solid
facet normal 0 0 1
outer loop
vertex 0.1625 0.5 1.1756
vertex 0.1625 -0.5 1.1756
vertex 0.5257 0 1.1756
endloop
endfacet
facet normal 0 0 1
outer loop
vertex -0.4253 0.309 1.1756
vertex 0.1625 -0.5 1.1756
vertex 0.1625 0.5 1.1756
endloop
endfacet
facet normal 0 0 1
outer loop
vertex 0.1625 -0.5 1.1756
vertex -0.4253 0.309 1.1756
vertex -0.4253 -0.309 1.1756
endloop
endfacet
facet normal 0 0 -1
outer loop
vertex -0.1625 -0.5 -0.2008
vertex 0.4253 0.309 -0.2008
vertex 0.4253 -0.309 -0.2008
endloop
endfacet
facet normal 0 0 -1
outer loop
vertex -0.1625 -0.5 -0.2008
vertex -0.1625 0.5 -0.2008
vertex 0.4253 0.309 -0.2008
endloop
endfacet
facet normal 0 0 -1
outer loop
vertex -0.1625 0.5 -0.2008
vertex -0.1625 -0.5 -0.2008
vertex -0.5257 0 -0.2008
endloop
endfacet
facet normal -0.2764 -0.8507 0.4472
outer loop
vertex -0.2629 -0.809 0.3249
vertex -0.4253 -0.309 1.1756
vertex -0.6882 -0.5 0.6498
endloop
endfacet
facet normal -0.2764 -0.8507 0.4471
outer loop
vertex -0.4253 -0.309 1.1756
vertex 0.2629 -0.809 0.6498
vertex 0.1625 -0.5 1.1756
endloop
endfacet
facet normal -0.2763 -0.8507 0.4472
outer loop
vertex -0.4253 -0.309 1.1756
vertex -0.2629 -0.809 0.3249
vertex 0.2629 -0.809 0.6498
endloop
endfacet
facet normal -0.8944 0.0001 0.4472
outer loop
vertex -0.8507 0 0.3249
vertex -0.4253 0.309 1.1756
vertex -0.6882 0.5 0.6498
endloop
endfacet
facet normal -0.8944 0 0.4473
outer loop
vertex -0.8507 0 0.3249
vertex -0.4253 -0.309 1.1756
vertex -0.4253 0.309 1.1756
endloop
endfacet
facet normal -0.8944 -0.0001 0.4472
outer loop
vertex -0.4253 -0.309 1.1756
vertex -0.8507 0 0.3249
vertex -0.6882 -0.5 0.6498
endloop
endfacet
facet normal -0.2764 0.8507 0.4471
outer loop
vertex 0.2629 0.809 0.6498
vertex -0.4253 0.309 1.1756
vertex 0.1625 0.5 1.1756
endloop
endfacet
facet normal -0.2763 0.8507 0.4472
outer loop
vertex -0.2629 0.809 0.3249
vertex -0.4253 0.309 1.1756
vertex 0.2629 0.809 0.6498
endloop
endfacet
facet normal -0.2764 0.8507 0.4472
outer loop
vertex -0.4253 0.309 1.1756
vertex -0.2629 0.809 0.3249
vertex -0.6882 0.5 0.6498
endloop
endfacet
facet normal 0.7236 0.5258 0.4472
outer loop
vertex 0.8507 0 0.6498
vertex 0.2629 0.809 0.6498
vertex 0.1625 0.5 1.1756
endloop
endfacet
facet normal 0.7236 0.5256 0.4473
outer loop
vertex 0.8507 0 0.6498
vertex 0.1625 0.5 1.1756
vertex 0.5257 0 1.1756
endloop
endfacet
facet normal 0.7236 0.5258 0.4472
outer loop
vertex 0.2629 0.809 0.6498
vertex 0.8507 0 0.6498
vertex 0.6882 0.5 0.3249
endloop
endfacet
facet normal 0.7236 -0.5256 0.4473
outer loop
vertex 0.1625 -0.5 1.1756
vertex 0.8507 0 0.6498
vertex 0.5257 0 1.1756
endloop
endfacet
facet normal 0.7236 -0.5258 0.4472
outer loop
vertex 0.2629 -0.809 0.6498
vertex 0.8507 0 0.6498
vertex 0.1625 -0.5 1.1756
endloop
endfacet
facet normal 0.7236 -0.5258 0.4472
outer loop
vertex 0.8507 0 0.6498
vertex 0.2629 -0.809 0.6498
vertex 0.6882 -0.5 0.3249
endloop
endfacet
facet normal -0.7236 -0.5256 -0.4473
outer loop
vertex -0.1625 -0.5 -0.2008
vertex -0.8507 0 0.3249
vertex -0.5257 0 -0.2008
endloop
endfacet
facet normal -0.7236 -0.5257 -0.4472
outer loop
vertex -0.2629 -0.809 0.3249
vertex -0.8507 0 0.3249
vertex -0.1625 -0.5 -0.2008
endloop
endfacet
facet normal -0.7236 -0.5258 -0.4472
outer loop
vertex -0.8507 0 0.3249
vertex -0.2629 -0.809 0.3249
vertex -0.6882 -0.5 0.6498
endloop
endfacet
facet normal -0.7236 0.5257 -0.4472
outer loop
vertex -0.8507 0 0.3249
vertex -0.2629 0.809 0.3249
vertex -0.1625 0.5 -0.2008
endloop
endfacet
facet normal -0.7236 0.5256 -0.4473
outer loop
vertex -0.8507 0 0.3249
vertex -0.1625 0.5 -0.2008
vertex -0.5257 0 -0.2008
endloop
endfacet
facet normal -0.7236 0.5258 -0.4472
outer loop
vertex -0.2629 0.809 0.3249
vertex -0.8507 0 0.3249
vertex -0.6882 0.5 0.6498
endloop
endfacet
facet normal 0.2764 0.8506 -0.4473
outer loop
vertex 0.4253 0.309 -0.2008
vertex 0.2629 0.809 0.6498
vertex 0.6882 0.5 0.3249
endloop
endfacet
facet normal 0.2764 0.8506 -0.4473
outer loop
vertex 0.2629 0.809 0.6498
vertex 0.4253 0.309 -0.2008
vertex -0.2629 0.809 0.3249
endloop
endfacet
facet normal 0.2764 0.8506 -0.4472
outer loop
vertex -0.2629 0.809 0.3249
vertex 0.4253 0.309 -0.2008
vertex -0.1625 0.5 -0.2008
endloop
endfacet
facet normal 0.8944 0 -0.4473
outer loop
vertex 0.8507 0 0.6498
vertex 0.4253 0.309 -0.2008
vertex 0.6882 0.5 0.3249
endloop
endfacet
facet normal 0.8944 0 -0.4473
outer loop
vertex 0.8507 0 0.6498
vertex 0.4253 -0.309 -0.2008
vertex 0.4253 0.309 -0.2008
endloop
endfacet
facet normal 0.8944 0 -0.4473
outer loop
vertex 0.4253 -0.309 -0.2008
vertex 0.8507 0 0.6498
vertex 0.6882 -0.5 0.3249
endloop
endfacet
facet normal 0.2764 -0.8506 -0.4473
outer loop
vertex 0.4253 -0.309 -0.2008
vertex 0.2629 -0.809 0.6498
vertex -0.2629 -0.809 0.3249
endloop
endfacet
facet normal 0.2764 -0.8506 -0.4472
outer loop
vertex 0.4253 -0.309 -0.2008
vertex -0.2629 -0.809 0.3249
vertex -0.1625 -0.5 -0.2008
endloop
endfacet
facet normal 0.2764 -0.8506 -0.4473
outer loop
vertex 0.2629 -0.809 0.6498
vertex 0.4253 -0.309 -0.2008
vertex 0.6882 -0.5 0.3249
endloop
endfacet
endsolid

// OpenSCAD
function mod(a,m) = ((a%m)+m)%m;

function add(v, i = 0, r) = 
    i < len(v) ? 
        i == 0 ?
            add(v, 1, v[0]) :
            add(v, i + 1, r + v[i]) :
        r;


function Rout(n) = (1/(2*sin(180/n)));

function Rin(n) = 1/(2*tan(180/n));

function polyangle(n=3, phi=0, z=0) = 
let (r = 1/(2*sin(180/n)), al = 360/n)
[
    for(i=[0: 1: n-1]) [r*cos(i*al+phi),r*sin(i*al+phi),z]
];

function hAntiprism(n) = sqrt(pow(sin(60),2) - pow(Rout(n)-Rin(n),2));
    
function hPyramid(n) = sqrt(1 - pow(Rout(n),2));
    
function FaceCenter(points, face) = 
    let (fp = [for(i=face) points[i]])
        add(fp)/len(fp);

module pyramid(n=3){
    base = polyangle(n);
    top = [0,0, sqrt(1 - pow(Rout(n),2))];
    l = len(base);
    points = [for(b = base) b, top];
    
    faces = [
        [for(i=[0:1:l-1]) i],
        for(i=[l-1:-1:0]) [i, mod(i-1,l), l]
    ];
    
    polyhedron(points, faces);
}

module prism(n=3){
    bottom = polyangle(n);
    top = polyangle(n,z=1);
    l = len(top);
    points = [
        for(b = bottom) b,
        for(b = top) b
    ];
        
    faces = [
        [for(i=[0:1:l-1]) i],
        [for(i=[l-1:-1:0]) l+i],
        for(i=[l-1:-1:0]) let (j=mod(i-1,l)) [i, j, l+j, l+i]
    ];        
        
    polyhedron(points, faces);
}

module antiprism(n=3){
    bottom = polyangle(n);
    top = polyangle(n,phi=180/n,z=hAntiprism(n));
    l = len(top);

    points = [
        for(b = bottom) b,
        for(b = top) b
    ];
    faces = [
        [for(i=[0:1:l-1]) i],
        [for(i=[l-1:-1:0]) l+i],
        for(i=[l-1:-1:0]) let (j=mod(i-1,l)) [i, j, l+j],
        for(i=[l-1:-1:0]) let (j=mod(i-1,l)) [i, l+j, l+i]
    ];        
                
    polyhedron(points, faces);
}

module icosahedron(){
    ha = hAntiprism(5);
    hp = hPyramid(5);
    bottom = polyangle(5);
    top = polyangle(5,phi=180/5,z=ha);
    toptop = [0,0,ha+hp];
    botbot = [0,0,-hp];
    
    l=5;
    points = [
        for(b = bottom) b,
        for(b = top) b,
        toptop, botbot
    ];
    faces = [
        for(i=[l-1:-1:0]) let (j=mod(i-1,l)) [i, j, l+j],
        for(i=[l-1:-1:0]) let (j=mod(i-1,l)) [i, l+j, l+i],
        for(i=[l-1:-1:0]) [mod(i-1,l), i, 2*l+1],
        for(i=[l-1:-1:0]) [l+i, l+ mod(i-1,l), 2*l]
    ];
        
    polyhedron(points, faces);
}

module dodecahedron(){
    
    ha = hAntiprism(5);
    hp = hPyramid(5);
    bottom = polyangle(5);
    top = polyangle(5,phi=180/5,z=ha);
    toptop = [0,0,ha+hp];
    botbot = [0,0,-hp];
    
    l=5;
    
    
    ipoints = [
        for(b = bottom) b,
        for(b = top) b,
        toptop, botbot
    ];   
       
    topface = [
        for(i=[l-1:-1:0]) FaceCenter(ipoints, [l+i, l+ mod(i-1,l), 2*l])
    ];
        
    botface = [
        for(i=[l-1:-1:0]) FaceCenter(ipoints, [mod(i-1,l), i, 2*l+1])
    ];
        
    botlater = [
        for(i=[l-1:-1:0]) let (j=mod(i-1,l)) FaceCenter(ipoints,[i, j, l+j])
    ];

    toplater = [
        for(i=[l-1:-1:0]) let (j=mod(i-1,l)) FaceCenter(ipoints,[i, l+j, l+i])
    ];
      
    d = sqrt(add([for(i=toplater[0]-toplater[1]) i*i]));
    
    points = [
        for(b = botface) b,
        for(b = topface) b,
        for(b = toplater) b,
        for(b = botlater) b
    ]/d;
        
    faces = [
        [for(b=[5:1:9]) b],
        [for(b=[4:-1:0]) b],
        for(i=[0:1:4]) let (j = mod(i+1,5)) [
            5+i, 10+i, 15+i, 10+j, 5+j
        ],
        for(i=[0:1:4]) let (j = mod(i+1,5)) [
            j, 15+j, 10+j, 15+i, i
        ],
        
    ];
    
    polyhedron(points, faces);
}

dodecahedron();
